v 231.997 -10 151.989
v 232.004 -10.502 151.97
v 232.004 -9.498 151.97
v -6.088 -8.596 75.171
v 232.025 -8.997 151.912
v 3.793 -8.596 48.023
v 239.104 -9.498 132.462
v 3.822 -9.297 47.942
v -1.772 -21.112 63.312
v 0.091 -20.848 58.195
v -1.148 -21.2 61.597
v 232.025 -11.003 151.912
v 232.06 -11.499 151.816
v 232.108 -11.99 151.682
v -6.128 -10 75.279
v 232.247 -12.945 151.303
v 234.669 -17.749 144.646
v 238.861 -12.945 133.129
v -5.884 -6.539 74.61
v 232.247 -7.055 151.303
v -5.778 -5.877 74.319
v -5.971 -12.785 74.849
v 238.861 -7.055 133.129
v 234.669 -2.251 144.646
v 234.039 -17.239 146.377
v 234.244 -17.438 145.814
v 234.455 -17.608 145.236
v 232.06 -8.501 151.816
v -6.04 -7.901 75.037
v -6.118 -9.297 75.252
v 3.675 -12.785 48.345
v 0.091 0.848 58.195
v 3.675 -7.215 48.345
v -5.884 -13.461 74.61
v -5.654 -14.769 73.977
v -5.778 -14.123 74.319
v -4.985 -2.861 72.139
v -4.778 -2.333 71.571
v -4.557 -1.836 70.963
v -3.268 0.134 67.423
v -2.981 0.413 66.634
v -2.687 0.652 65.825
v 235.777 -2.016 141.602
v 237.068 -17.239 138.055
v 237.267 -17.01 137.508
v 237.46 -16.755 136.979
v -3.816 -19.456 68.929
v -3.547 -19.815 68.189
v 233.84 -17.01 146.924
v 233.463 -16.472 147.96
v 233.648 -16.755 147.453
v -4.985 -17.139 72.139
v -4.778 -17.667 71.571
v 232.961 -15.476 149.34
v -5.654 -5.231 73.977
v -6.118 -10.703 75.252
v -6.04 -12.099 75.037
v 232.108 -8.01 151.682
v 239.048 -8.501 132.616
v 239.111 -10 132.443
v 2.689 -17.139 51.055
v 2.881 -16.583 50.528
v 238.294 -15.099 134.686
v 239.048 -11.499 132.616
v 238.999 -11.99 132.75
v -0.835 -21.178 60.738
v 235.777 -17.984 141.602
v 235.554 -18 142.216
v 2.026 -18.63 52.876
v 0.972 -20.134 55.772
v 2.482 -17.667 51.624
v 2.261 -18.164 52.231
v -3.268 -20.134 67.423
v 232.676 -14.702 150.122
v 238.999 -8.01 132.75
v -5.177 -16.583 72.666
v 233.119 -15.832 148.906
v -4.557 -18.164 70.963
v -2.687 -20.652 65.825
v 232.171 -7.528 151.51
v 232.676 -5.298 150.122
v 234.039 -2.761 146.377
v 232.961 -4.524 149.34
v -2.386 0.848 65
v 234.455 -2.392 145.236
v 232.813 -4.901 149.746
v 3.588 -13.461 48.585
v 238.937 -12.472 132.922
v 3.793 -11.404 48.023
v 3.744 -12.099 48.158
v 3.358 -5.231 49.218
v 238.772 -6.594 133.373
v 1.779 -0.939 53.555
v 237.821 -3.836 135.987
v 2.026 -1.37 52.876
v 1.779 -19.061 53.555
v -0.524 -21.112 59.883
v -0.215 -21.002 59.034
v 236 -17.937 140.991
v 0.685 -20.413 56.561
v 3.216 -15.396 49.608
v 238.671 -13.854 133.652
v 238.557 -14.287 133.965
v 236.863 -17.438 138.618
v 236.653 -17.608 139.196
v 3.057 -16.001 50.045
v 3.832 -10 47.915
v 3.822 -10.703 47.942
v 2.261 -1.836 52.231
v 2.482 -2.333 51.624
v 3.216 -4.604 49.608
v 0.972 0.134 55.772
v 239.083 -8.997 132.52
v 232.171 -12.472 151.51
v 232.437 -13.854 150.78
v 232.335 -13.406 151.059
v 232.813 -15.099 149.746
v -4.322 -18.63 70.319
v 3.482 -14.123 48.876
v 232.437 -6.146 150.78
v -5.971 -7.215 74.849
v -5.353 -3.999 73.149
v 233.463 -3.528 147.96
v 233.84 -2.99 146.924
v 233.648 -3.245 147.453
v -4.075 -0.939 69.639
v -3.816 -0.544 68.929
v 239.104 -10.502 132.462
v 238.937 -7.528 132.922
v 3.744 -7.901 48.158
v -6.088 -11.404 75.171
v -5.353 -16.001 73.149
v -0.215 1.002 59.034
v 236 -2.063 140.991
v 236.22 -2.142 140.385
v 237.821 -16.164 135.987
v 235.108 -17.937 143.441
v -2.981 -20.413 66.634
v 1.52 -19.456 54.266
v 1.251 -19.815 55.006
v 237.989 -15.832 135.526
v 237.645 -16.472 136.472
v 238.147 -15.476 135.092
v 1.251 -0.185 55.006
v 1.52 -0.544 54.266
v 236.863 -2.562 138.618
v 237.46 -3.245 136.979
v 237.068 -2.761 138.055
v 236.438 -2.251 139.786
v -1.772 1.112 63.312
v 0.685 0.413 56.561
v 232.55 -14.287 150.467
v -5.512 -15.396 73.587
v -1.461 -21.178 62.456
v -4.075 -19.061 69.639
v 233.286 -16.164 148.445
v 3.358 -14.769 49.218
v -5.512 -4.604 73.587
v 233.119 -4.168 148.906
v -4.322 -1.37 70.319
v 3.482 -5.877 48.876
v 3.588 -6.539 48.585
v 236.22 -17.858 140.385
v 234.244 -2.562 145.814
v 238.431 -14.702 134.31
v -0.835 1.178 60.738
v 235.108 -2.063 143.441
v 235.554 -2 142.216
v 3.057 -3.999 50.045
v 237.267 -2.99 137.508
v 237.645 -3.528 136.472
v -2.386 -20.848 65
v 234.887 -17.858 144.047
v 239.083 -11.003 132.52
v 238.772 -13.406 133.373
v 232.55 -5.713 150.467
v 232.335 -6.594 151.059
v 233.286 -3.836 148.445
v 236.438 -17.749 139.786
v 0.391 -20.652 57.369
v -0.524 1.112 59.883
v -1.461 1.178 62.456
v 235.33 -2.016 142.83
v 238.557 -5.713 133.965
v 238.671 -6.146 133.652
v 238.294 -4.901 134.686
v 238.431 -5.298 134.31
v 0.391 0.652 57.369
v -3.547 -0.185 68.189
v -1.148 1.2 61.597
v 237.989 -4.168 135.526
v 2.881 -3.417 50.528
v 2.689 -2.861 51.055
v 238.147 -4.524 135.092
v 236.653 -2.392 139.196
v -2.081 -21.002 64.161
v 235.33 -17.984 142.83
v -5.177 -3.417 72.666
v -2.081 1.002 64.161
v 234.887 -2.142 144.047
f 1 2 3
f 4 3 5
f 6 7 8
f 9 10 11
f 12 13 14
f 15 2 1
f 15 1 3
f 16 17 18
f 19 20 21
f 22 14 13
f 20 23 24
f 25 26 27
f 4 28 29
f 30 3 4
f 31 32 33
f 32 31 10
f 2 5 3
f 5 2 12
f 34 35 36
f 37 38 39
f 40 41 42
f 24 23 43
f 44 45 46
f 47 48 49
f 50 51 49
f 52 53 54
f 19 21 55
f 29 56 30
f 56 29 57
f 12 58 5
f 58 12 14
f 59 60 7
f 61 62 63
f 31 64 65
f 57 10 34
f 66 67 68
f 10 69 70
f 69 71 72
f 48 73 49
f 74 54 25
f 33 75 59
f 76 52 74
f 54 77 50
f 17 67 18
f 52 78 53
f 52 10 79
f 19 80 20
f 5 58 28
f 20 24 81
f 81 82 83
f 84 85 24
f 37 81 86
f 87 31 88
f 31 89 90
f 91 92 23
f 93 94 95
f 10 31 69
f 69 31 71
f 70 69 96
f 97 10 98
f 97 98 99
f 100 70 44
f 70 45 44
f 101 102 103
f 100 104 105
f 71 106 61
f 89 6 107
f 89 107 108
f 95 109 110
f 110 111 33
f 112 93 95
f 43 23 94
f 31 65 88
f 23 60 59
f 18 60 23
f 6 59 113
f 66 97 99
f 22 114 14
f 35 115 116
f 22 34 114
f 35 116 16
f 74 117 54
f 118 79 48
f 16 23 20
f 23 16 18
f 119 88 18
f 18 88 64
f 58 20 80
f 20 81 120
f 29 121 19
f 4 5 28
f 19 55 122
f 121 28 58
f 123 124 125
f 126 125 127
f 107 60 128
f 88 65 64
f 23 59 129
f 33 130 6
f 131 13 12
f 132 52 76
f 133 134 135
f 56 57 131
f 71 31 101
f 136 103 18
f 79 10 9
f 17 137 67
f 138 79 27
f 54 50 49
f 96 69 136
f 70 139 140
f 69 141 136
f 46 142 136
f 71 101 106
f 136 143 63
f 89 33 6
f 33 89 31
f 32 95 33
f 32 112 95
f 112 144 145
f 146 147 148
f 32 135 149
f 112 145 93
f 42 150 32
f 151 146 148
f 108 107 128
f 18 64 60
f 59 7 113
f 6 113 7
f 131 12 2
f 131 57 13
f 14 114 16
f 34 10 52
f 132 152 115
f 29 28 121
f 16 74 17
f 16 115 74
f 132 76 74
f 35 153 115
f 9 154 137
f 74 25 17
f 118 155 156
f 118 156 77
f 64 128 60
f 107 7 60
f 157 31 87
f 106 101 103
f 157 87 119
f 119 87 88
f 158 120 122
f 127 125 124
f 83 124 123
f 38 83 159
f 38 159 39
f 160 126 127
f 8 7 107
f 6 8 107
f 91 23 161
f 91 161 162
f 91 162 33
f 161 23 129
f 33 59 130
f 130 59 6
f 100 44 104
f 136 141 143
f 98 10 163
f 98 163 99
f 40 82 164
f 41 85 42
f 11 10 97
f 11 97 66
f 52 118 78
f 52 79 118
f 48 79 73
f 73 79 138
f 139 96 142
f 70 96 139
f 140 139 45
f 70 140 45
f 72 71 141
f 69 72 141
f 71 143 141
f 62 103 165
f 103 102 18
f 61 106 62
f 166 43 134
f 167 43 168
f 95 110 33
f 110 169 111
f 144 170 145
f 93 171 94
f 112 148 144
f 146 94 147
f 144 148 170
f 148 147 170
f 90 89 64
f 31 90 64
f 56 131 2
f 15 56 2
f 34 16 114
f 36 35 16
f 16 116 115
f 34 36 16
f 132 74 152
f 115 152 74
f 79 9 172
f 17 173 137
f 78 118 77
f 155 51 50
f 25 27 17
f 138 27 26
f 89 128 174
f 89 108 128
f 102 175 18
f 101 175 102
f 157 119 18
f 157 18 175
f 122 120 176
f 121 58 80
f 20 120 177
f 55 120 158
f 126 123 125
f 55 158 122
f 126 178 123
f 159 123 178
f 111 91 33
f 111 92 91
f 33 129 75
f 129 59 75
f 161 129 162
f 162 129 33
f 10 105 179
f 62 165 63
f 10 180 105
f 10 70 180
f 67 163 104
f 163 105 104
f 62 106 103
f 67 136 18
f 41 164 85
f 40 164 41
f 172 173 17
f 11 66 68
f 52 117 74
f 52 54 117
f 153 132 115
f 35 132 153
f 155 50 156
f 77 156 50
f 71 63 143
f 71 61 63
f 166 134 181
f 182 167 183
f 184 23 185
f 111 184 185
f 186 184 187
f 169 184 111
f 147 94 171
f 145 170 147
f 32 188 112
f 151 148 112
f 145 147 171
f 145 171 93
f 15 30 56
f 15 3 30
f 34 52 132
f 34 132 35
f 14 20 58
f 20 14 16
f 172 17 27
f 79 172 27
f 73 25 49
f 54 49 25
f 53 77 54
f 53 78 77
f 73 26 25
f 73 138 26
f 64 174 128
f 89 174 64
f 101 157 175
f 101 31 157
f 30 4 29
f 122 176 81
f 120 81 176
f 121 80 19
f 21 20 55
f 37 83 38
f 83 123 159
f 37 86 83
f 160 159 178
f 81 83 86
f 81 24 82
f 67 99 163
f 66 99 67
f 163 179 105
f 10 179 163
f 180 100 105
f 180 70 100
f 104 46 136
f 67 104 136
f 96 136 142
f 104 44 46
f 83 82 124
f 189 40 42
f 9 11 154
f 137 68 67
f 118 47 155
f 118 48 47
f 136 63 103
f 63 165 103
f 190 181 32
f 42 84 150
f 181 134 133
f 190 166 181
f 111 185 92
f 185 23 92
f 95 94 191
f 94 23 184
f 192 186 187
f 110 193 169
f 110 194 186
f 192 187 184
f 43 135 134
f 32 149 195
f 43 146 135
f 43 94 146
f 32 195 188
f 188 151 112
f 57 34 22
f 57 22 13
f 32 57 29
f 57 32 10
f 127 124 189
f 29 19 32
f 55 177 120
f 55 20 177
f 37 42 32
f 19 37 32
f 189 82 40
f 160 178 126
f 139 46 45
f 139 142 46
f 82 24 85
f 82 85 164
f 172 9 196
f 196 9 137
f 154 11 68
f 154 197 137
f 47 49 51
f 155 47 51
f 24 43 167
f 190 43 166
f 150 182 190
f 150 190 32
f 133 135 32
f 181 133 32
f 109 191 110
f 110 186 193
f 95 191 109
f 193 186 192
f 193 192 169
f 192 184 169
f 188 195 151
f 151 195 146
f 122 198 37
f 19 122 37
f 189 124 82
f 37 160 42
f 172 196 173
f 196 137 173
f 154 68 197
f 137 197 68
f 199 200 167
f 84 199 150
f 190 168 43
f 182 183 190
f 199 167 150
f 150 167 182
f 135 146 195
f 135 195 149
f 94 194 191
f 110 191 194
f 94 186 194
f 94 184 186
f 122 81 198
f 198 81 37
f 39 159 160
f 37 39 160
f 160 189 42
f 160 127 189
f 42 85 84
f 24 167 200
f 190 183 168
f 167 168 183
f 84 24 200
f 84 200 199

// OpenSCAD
/* 形成一个六面体
    传递六面体的8个点，！有顺序:
       7--6
      /| /|
    3--2  |
    |  5--4
    | /| /
    1--0
*/
module make_hexahedron(points){
    polyhedron(points=points, faces=[[0, 1, 3, 2],
        [0, 1, 5, 4],
        [4, 5, 7, 6],
        [7, 6, 2, 3],
        [0, 2, 6, 4],
        [1, 3, 7, 5]
        ]);
}

// 下嘴唇
lower_lip_points = [
        [-19, 2.8, 2], //0
        [-19, -2.8, 2], //1
        [-20, 2.8, 3], //2
        [-20, -2.8, 3], //3
        [-7, 6, 13], //4
        [-7, -6, 13], //5
        [-8.8, 6, 16.2], //6
        [-8.8, -6, 16.2] //7
        ];

// 上嘴唇
upper_lip_points = [
        [-21.7, 3.2, 5.5], //0
        [-21.7, -3.2, 5.5], //1
        [-23.9, 3.2, 8], //2
        [-23.9, -3.2, 8], //3
        [-8.8, 6, 16.4], //4
        [-8.8, -6, 16.4], //5
        [-12, 6, 20.3], //6
        [-12, -6, 20.3] //7
        ];
      
// 龙头  
head_points = [
        [-7, 6, 13], //0
        [-7, -6, 13], //1
        [-13, 6, 21], //2
        [-13, -6, 21], //3
        [15, 9, 29], //4
        [15, -9, 29], //5
        [5, 9, 42], //6
        [5, -9, 42] //7
        ];

make_hexahedron(lower_lip_points);
make_hexahedron(upper_lip_points);
make_hexahedron(head_points);

translate([240, -10, 130])
rotate([0, -20, 0])
rotate([0, -90, 0])
scale([1.3, 1, 1])
linear_extrude(height = 250, center = false, convexity = 10, twist = 0, $fn = 100, scale = 1.4)
translate([10, 0, 0])
circle(r = 8);


/*
// 上嘴唇
translate([-21.6, 0, 5.5])
rotate([-42, 0, 90])
scale([1, 1.8, 1])
rotate_extrude(angle = 180, convexity = 10, $fn = 200)
square(size = [3.2, 3.3]);
*/
